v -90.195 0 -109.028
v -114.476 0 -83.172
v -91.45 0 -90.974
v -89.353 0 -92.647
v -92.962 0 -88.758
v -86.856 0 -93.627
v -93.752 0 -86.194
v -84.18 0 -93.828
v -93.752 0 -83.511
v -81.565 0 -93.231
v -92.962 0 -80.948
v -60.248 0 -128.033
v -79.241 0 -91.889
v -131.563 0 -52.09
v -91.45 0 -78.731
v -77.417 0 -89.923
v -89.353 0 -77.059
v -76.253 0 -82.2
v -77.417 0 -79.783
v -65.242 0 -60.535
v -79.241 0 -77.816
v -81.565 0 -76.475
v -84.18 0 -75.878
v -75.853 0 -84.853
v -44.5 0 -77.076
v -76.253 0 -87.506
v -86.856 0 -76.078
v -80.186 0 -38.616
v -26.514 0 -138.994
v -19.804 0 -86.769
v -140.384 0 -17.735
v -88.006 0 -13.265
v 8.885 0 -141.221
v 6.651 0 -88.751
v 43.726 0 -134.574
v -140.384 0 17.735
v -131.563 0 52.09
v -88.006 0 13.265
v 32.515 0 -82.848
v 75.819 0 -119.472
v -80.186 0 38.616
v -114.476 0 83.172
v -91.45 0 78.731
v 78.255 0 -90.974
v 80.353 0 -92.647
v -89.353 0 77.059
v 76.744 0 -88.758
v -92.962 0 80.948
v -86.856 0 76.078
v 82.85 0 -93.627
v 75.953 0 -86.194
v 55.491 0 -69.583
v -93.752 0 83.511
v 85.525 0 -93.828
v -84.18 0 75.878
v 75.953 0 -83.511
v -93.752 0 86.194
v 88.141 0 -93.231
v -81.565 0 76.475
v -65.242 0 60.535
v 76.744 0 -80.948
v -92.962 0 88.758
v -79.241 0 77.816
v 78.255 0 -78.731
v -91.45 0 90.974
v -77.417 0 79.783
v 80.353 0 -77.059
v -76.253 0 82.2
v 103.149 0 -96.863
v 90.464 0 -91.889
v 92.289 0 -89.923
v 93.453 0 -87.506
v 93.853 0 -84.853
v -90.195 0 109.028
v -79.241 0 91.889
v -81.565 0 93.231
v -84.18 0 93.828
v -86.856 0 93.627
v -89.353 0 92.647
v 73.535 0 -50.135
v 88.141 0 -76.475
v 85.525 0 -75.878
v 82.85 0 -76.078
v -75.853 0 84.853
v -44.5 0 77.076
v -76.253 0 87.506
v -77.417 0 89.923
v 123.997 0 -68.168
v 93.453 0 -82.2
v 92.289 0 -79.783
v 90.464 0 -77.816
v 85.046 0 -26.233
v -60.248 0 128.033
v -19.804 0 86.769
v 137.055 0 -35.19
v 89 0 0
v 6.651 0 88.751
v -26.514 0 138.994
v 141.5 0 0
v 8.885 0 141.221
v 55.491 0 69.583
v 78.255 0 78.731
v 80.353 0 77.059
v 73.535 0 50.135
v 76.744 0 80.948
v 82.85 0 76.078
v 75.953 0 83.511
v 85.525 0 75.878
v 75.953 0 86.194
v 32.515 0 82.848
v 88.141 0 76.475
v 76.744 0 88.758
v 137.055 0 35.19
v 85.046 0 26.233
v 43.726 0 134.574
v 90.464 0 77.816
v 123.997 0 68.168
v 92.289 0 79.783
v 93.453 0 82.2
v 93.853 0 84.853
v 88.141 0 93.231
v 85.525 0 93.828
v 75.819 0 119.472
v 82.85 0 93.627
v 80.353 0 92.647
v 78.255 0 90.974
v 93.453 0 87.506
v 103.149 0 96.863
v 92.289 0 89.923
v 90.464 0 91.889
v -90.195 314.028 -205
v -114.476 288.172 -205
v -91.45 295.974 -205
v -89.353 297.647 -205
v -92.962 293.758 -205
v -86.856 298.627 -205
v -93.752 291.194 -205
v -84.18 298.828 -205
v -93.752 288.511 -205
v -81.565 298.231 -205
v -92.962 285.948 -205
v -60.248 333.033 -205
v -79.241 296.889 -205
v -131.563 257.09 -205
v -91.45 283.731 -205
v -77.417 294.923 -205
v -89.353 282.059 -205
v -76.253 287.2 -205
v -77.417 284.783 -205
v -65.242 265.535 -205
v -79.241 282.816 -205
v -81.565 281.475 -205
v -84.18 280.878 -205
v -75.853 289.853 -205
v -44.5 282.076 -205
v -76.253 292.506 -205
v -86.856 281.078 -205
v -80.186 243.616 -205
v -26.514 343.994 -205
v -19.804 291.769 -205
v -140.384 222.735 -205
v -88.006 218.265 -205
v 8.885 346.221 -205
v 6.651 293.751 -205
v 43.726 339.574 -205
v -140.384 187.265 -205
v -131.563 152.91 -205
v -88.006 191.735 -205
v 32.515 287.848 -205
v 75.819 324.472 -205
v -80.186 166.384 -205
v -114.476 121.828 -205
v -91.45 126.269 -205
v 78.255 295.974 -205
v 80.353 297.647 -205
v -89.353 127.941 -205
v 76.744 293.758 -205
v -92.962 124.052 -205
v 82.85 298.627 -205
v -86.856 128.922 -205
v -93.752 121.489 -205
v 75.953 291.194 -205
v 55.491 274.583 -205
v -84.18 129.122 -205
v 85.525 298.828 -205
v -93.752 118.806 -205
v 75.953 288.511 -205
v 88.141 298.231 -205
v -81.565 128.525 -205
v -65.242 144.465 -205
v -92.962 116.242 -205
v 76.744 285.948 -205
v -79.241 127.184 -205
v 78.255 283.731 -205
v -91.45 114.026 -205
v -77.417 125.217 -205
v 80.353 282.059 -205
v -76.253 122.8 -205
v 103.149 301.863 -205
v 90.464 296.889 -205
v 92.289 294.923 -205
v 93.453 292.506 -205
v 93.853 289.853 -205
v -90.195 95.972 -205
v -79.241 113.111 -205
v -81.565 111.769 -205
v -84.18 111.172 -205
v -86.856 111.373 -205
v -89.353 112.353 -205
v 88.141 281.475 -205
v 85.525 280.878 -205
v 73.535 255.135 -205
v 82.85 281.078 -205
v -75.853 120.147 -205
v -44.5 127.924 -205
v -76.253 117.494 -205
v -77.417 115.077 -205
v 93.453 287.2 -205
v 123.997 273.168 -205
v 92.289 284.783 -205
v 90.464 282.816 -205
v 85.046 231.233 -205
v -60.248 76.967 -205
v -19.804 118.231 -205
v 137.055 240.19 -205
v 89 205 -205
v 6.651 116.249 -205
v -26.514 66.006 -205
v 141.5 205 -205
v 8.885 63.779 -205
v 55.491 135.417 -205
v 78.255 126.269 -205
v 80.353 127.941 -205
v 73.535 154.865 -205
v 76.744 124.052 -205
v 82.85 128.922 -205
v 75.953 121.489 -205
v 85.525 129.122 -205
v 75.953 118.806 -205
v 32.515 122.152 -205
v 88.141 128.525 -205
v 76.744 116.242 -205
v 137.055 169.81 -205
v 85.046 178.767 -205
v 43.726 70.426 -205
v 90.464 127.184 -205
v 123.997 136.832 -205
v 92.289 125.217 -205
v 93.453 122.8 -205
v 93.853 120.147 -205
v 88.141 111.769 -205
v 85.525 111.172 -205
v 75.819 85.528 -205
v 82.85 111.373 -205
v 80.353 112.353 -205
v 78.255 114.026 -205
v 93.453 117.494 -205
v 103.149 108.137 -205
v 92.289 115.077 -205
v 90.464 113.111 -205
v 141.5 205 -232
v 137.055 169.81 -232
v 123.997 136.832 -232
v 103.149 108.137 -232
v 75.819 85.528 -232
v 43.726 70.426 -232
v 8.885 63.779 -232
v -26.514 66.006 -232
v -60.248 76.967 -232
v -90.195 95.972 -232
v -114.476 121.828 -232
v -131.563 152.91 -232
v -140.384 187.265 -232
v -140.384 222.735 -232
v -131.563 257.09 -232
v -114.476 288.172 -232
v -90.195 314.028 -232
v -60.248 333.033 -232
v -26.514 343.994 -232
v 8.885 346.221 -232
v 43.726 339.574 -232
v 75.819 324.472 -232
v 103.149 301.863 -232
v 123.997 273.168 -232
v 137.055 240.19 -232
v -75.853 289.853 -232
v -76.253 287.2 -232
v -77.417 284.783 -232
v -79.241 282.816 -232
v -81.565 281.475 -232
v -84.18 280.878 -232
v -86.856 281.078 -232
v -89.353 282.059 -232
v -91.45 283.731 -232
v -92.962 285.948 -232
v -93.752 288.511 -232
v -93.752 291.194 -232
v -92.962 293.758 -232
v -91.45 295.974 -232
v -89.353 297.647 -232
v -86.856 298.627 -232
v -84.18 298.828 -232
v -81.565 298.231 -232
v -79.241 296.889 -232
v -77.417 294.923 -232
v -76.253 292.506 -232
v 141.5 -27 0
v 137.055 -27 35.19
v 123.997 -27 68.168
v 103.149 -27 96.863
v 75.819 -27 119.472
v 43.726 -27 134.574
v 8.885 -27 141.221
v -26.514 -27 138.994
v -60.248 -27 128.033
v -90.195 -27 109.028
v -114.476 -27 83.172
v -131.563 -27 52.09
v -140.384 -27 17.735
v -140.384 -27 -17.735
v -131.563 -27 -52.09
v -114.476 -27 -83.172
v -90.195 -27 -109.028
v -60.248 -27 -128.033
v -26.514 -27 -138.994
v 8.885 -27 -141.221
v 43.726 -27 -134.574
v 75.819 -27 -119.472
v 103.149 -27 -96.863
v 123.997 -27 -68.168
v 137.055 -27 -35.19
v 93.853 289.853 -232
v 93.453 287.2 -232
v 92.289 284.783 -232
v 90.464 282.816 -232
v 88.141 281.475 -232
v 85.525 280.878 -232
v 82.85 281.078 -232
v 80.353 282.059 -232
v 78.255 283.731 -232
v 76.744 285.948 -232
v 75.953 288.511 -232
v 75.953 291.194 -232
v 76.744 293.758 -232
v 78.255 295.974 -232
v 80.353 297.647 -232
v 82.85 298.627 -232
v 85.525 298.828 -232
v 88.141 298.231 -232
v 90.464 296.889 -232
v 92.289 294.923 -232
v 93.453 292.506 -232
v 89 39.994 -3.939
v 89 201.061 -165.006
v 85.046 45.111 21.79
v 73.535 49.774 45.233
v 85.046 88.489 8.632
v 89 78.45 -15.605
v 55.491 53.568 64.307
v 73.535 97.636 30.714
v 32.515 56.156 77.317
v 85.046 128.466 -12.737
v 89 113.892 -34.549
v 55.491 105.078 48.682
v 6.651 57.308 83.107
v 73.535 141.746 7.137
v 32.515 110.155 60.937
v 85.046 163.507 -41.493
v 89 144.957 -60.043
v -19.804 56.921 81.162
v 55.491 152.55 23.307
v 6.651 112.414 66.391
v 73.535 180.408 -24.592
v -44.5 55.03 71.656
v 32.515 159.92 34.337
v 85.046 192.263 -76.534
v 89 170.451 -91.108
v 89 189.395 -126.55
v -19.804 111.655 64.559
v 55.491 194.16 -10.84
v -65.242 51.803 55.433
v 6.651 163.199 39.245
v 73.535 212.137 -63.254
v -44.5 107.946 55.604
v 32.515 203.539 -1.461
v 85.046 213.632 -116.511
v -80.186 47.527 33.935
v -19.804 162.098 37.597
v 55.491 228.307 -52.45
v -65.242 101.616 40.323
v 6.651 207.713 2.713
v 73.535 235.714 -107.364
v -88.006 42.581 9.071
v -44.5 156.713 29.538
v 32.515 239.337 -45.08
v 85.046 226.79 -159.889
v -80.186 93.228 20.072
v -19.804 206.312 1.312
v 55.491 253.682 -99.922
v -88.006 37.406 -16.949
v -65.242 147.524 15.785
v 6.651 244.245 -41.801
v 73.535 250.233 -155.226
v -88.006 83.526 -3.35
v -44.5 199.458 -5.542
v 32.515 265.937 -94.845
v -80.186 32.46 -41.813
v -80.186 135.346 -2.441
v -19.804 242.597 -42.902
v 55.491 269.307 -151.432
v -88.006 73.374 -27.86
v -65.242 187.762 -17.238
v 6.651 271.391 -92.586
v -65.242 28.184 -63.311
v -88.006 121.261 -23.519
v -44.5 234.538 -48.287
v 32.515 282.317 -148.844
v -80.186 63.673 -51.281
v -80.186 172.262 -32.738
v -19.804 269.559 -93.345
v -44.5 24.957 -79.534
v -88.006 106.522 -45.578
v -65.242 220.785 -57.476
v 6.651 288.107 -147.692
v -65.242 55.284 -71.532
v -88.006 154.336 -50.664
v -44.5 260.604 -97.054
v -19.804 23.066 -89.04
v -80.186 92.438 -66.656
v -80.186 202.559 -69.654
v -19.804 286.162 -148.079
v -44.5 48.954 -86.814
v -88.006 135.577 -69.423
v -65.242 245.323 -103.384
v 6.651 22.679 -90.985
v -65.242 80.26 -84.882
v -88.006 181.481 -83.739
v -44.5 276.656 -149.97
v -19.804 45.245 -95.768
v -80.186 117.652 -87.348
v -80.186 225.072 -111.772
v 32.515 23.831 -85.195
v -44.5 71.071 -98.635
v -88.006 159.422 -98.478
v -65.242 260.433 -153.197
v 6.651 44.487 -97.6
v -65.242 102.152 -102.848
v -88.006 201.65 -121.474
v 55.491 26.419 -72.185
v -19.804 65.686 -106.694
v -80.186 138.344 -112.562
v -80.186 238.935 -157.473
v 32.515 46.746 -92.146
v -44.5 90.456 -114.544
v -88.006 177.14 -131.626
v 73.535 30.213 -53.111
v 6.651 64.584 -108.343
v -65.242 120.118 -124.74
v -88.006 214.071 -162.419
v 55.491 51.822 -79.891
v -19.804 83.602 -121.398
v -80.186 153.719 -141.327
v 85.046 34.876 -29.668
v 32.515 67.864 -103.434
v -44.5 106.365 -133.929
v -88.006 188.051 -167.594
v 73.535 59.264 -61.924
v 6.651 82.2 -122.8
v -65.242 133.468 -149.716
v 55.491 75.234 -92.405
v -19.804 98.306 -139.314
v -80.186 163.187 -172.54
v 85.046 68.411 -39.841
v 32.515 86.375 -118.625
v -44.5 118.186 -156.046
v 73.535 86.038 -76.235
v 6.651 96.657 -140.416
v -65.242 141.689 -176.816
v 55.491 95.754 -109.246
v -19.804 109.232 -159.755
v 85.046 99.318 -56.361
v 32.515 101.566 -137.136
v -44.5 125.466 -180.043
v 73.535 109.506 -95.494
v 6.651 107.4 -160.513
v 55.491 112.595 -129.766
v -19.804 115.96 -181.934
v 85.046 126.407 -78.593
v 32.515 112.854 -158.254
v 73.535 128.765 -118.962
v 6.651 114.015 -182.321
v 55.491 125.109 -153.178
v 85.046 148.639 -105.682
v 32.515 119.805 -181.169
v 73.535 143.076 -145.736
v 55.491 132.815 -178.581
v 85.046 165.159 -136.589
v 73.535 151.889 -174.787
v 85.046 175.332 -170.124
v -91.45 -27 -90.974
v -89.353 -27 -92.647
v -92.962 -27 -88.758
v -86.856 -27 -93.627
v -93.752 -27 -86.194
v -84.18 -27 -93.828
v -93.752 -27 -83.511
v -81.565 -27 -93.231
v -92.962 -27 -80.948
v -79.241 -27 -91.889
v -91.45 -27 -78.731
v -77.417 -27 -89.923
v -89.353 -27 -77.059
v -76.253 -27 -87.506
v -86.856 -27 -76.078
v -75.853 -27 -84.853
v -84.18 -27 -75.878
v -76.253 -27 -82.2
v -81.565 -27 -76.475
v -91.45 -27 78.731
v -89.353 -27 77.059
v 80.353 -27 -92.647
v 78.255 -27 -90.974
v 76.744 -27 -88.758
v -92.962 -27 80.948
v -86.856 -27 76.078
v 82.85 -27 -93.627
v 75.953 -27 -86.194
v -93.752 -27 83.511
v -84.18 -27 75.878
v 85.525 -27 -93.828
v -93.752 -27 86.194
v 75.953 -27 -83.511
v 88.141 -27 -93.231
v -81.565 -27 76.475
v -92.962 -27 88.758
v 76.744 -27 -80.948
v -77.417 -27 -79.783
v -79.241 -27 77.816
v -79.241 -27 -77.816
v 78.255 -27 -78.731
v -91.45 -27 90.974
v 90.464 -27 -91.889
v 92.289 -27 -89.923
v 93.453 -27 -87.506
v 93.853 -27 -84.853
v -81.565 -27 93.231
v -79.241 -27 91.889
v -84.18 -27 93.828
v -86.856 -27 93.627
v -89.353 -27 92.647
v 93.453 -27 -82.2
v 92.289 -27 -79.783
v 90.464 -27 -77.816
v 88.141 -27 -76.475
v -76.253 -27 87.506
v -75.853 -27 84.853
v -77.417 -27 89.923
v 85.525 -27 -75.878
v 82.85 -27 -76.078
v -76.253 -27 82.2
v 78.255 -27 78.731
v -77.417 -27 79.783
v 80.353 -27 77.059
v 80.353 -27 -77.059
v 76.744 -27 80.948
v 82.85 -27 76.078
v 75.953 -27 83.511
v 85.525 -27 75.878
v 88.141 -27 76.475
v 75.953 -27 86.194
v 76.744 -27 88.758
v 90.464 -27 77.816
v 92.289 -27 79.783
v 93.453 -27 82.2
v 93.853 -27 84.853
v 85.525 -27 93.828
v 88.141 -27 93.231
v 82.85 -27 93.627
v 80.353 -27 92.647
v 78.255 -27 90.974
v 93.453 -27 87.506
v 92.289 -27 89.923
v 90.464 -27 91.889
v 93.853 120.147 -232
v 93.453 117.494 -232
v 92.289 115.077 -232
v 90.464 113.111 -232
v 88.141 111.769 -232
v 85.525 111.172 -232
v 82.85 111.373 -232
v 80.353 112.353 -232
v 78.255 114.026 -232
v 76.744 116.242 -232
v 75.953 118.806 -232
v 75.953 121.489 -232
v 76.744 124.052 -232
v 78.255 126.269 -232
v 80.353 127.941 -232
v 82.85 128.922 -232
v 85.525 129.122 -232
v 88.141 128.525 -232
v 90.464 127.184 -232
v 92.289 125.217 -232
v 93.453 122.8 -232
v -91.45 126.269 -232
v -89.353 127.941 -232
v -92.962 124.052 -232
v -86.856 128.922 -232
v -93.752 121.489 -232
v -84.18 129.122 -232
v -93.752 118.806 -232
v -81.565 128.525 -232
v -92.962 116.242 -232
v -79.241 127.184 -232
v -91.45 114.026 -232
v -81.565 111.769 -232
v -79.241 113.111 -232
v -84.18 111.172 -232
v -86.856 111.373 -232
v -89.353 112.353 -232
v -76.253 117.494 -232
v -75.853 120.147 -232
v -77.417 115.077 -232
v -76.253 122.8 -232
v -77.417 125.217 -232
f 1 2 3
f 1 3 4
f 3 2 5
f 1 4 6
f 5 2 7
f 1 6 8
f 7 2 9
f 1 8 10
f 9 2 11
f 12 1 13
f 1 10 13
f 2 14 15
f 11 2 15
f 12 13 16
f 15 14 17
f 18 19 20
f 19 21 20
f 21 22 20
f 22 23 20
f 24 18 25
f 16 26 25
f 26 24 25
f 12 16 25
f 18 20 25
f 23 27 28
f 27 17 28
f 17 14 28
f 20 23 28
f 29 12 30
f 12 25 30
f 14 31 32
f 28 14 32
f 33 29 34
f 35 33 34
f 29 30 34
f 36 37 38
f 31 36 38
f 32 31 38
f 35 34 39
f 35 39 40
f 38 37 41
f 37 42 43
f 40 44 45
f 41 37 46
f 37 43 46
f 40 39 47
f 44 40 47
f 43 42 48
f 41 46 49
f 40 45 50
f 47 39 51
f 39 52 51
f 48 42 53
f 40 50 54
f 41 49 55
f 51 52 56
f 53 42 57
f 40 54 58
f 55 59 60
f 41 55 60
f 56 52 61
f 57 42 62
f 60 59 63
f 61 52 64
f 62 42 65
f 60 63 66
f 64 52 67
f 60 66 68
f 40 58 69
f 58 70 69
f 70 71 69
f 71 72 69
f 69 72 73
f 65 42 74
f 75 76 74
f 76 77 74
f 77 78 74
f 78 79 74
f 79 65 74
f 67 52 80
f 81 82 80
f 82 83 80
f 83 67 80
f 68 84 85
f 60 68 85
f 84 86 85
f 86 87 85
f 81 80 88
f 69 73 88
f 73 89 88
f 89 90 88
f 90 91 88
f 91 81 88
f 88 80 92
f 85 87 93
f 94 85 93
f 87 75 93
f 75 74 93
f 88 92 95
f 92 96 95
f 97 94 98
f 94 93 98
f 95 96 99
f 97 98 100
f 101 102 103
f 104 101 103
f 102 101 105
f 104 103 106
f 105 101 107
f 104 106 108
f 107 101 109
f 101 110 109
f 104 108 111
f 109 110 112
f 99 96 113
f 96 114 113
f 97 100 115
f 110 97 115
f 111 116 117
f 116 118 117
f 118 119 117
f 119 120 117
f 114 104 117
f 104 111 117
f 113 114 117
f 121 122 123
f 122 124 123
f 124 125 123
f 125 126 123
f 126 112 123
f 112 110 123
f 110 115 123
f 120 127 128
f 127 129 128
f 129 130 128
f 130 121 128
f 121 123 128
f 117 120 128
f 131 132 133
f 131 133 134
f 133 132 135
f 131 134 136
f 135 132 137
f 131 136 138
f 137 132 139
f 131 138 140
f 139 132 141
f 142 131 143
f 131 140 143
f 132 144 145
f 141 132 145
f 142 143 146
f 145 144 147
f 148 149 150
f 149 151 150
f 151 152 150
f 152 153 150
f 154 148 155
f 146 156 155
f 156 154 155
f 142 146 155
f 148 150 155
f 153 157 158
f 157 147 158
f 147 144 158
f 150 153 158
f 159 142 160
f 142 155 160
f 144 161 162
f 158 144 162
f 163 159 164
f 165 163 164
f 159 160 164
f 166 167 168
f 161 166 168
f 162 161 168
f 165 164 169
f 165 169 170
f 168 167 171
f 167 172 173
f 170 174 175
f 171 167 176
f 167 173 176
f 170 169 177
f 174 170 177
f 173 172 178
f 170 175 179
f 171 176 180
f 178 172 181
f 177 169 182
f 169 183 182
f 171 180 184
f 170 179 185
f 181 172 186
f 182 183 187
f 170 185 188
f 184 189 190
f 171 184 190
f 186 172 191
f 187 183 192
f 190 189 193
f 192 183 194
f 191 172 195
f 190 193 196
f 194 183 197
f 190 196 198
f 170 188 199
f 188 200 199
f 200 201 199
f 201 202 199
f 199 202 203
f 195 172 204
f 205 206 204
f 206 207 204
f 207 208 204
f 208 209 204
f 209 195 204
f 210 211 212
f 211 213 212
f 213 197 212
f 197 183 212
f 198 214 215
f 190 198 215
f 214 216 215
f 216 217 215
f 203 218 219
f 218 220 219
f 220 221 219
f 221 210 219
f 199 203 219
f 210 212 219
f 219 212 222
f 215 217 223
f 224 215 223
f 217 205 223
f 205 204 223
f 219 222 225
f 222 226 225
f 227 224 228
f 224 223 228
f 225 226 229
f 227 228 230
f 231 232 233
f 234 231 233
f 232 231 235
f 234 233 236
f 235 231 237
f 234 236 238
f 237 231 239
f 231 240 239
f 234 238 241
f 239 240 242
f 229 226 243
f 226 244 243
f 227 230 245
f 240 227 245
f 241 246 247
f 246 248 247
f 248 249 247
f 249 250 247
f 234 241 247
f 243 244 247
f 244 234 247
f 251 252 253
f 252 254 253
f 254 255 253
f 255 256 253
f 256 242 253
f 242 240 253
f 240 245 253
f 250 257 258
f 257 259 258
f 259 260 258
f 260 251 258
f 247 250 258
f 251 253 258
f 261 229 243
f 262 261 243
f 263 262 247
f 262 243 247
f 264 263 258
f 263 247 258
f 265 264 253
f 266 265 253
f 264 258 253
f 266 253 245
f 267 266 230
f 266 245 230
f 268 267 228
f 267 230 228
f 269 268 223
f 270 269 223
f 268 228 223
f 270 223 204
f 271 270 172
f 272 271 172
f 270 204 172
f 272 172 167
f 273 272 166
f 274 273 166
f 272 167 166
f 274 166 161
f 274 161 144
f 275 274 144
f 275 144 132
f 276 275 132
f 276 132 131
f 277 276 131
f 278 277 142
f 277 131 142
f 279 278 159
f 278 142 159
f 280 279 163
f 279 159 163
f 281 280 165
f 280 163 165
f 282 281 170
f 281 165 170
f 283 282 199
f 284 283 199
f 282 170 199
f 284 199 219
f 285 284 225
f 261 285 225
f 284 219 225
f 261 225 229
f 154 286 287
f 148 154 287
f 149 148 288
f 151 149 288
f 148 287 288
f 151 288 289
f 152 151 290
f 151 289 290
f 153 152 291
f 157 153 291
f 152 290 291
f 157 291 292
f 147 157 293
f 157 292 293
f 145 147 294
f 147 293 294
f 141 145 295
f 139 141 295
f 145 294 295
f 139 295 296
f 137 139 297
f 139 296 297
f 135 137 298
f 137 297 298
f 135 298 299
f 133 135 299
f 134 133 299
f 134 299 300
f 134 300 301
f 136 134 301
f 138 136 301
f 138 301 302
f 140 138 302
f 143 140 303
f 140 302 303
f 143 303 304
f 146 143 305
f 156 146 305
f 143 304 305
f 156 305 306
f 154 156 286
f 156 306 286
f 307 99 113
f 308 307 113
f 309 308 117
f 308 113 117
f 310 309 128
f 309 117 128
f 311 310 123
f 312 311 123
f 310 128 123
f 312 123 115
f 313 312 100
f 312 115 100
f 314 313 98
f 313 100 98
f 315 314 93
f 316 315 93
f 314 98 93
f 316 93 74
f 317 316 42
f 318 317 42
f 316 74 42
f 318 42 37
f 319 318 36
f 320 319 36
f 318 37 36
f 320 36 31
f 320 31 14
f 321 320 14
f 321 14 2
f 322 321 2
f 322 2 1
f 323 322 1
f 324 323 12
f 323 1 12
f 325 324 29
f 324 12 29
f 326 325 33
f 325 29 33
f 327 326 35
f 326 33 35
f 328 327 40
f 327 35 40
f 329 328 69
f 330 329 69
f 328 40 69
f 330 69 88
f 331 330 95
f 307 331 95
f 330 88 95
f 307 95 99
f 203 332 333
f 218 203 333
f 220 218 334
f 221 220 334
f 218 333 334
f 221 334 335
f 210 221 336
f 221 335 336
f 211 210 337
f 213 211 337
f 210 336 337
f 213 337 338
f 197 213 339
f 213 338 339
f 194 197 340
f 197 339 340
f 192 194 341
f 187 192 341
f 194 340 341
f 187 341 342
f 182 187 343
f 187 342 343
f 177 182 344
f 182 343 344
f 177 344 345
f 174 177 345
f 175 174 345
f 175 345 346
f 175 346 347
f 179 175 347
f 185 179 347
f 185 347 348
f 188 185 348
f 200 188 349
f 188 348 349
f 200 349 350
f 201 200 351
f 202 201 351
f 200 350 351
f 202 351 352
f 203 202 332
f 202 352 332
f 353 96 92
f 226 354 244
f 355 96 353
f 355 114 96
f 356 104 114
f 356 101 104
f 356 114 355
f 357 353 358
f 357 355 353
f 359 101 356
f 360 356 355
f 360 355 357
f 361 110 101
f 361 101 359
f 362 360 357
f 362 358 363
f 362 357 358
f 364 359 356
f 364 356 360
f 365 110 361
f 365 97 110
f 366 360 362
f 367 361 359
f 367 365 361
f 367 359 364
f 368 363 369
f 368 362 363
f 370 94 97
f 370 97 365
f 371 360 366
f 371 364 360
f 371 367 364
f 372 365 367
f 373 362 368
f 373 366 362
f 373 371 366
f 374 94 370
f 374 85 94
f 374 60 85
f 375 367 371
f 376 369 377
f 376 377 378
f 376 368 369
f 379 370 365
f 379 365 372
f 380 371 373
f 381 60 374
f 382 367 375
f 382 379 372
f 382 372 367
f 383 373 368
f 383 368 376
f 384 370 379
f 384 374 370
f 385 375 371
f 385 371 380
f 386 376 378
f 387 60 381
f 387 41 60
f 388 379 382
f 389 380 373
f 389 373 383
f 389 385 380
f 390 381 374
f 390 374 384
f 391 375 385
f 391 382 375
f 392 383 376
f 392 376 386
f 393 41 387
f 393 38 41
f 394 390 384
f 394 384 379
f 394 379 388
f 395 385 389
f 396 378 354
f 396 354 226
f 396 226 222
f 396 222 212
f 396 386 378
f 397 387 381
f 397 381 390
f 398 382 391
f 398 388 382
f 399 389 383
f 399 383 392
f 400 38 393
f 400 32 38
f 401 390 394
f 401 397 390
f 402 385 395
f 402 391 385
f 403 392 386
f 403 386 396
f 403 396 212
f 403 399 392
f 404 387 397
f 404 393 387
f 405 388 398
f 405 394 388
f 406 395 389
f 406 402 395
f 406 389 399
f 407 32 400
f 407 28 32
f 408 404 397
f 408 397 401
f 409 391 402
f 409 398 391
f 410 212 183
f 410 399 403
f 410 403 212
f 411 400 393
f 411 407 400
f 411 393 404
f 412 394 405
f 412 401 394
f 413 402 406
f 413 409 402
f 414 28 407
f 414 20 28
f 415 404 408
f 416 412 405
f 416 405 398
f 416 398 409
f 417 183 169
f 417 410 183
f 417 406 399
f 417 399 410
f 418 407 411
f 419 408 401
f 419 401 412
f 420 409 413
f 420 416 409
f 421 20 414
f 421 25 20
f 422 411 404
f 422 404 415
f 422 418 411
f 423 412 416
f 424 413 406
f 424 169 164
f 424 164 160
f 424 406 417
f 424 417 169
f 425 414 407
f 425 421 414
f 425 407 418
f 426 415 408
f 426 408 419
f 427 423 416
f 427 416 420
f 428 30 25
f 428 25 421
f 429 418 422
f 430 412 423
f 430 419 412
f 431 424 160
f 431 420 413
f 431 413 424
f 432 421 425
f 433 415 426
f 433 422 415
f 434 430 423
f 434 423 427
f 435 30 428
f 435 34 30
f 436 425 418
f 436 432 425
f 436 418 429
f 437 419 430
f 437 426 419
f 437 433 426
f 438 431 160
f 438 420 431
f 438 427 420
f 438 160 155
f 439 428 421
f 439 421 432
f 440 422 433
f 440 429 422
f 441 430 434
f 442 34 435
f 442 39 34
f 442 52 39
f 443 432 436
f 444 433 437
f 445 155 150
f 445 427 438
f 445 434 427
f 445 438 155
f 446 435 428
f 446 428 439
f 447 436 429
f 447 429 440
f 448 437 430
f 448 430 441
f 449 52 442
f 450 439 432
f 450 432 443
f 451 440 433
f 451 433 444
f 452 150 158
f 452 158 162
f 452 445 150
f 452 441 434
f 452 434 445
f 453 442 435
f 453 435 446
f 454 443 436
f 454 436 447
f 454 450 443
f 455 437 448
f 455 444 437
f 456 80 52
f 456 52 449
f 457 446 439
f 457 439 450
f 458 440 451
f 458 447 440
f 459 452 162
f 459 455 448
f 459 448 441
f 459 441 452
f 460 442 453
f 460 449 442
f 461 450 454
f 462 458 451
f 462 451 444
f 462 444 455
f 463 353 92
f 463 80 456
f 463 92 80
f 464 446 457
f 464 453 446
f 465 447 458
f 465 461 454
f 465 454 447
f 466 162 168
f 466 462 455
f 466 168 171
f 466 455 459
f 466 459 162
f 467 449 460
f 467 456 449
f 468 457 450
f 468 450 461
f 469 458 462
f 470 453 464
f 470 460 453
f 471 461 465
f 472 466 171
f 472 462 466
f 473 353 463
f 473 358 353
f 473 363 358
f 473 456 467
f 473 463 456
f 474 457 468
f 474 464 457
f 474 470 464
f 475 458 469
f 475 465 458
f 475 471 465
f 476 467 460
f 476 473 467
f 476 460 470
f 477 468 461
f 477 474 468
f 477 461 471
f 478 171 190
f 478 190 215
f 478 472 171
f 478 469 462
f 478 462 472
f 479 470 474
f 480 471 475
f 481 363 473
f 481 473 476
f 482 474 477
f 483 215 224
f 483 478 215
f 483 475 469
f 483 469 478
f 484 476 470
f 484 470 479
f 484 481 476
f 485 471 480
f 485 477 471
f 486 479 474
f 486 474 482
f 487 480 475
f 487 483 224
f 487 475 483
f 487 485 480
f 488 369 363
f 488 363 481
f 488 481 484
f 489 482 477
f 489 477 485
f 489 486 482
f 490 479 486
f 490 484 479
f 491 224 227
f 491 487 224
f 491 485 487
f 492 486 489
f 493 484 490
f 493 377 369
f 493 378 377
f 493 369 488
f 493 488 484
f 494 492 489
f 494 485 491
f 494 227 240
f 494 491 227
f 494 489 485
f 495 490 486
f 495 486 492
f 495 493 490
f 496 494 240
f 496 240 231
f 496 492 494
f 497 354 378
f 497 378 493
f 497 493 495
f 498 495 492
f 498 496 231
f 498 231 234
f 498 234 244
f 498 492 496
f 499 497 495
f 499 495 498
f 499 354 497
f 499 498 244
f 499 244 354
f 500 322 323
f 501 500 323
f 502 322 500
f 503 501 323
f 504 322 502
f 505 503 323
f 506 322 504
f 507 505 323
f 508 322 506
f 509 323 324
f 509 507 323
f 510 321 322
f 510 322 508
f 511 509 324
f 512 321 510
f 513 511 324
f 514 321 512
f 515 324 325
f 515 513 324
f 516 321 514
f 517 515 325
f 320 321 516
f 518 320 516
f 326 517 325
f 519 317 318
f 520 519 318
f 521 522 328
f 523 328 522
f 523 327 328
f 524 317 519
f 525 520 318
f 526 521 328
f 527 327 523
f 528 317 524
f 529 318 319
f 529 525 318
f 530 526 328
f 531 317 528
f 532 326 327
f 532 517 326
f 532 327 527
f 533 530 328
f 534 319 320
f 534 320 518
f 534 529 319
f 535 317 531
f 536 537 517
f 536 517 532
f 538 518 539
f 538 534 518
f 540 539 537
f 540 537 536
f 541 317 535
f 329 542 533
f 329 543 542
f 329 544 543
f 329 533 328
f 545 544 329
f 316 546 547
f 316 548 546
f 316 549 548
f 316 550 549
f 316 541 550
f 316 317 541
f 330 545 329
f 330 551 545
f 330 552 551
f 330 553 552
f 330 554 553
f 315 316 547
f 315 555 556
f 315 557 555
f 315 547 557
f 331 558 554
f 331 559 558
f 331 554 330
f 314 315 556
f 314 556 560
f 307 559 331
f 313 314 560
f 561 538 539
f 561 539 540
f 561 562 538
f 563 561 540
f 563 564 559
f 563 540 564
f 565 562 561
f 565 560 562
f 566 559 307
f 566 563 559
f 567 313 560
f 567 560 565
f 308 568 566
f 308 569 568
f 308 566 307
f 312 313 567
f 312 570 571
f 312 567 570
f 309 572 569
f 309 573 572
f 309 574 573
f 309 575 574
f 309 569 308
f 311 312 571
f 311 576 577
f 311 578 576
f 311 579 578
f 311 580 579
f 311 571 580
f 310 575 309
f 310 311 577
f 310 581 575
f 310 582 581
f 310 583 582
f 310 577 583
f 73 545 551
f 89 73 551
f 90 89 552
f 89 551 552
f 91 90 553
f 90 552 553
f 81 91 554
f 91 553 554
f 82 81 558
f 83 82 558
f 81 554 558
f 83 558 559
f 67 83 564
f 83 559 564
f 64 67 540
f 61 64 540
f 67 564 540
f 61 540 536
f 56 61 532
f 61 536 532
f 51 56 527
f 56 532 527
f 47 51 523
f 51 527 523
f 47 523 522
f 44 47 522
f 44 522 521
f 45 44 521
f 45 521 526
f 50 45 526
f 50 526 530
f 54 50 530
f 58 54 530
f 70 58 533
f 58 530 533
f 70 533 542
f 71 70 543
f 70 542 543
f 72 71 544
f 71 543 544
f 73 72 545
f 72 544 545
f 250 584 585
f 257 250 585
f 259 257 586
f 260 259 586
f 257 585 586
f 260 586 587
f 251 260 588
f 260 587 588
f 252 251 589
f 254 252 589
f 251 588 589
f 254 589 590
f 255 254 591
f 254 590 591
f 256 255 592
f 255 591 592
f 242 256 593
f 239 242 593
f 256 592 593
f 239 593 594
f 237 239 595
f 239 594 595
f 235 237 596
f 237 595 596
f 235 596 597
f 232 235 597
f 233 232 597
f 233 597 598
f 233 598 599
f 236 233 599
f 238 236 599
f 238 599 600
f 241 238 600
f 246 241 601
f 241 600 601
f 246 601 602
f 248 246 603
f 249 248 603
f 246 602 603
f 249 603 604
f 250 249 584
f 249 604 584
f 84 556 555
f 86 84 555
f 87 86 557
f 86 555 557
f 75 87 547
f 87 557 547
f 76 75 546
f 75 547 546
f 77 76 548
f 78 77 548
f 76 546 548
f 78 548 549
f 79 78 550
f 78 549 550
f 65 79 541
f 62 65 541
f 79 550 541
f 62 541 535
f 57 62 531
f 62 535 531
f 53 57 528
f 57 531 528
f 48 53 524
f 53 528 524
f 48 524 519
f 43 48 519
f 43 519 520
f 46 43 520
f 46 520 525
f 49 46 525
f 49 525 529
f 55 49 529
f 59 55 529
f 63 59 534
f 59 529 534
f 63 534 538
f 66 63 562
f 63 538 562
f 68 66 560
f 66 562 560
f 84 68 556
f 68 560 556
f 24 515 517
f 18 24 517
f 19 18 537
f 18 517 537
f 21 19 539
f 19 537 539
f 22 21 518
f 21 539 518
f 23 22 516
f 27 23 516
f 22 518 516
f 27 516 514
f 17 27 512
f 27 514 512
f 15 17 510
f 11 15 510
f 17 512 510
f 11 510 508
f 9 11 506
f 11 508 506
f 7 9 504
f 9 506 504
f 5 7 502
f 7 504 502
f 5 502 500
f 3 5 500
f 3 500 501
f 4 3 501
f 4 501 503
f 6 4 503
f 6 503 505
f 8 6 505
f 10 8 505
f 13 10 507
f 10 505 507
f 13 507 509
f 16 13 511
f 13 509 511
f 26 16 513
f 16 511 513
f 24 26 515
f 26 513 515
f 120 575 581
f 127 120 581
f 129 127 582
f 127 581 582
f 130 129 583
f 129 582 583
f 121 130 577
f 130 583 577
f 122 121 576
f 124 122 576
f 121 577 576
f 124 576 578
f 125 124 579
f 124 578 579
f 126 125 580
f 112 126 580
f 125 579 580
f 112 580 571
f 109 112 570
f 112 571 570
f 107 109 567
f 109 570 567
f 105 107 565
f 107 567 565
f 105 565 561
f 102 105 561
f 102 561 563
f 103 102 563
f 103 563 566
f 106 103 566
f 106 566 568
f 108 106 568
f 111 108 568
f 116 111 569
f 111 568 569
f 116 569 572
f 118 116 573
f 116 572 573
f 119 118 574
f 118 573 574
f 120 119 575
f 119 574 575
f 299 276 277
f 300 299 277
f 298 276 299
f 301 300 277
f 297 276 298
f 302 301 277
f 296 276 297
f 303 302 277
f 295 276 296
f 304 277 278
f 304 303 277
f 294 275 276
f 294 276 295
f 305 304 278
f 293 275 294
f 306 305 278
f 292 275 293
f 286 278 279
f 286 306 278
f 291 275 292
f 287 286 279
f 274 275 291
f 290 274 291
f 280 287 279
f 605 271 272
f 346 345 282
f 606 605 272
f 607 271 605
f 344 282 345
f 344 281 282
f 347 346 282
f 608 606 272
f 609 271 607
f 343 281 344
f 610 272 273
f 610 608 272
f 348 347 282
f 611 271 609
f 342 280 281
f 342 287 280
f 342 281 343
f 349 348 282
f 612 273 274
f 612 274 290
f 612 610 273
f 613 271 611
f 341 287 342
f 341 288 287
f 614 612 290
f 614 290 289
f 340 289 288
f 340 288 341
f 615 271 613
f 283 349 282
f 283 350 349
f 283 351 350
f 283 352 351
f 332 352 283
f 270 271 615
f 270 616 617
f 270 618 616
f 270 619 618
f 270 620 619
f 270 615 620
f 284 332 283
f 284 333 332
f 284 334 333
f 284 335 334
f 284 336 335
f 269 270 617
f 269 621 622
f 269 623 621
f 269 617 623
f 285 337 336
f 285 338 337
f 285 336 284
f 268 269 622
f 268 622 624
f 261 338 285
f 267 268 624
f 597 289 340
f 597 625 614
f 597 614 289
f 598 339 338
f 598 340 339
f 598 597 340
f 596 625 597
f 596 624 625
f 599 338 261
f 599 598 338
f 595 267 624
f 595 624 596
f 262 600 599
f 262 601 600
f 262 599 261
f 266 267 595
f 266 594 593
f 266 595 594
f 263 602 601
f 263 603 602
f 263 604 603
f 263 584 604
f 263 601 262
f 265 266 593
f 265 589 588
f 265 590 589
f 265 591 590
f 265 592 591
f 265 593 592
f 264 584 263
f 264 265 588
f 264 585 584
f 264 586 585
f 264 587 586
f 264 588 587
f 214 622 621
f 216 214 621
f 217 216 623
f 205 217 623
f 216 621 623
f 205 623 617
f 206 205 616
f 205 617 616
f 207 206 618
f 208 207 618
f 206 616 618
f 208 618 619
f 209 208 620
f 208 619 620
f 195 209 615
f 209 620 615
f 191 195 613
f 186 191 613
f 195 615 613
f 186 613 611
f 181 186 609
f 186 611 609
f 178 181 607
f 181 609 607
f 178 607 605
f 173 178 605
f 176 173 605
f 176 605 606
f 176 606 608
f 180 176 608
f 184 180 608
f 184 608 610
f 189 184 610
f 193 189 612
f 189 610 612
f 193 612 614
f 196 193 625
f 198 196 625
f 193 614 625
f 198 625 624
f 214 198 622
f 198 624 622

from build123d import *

# Parameters (mm, degrees)
F0_R      = 89
F2_ANGLE  = 90
F3_R      = 141.5
F4_DEPTH  = 27
F5_R      = 141.5
F6_DEPTH  = 27
F7_R      = 9
F8_DEPTH  = 27
F9_R      = 9
F10_DEPTH = 27


with BuildPart() as f2:
    # F0 (on Front) → F2 (revolve)
    with BuildSketch(Plane.XZ):
        Circle(F0_R)
    revolve(axis=Axis((-94.423547, 0, -205), (-1, 0, 0)), revolution_arc=F2_ANGLE)

    # F3 (on face) → F4 (join)
    with BuildSketch(Plane.XZ):
        Circle(F3_R)
    extrude(amount=F4_DEPTH)

    # F5 (on face) → F6 (join)
    with BuildSketch(Plane(origin=(0, 0, -205), x_dir=(1, 0, 0), z_dir=(0, 0, -1))):
        with Locations((0, -205)):
            Circle(F5_R)
    extrude(amount=F6_DEPTH)

    # F7 (on face) → F8 (cut, through all)
    with BuildSketch(Plane(origin=(0, 0, -232), x_dir=(1, 0, 0), z_dir=(0, 0, -1))):
        with Locations((84.852814, -289.852814)):
            Circle(F7_R)
        with Locations((84.852814, -120.147186)):
            Circle(F7_R)
        with Locations((-84.852814, -120.147186)):
            Circle(F7_R)
        with Locations((-84.852814, -289.852814)):
            Circle(F7_R)
    extrude(amount=-F8_DEPTH, mode=Mode.SUBTRACT)

    # F9 (on face) → F10 (cut, through all)
    with BuildSketch(Plane.XZ.offset(27)):
        with Locations((-84.852814, 84.852814)):
            Circle(F9_R)
        with Locations((-84.852814, -84.852814)):
            Circle(F9_R)
        with Locations((84.852814, -84.852814)):
            Circle(F9_R)
        with Locations((84.852814, 84.852814)):
            Circle(F9_R)
    extrude(amount=-F10_DEPTH, mode=Mode.SUBTRACT)


solid = f2.part
